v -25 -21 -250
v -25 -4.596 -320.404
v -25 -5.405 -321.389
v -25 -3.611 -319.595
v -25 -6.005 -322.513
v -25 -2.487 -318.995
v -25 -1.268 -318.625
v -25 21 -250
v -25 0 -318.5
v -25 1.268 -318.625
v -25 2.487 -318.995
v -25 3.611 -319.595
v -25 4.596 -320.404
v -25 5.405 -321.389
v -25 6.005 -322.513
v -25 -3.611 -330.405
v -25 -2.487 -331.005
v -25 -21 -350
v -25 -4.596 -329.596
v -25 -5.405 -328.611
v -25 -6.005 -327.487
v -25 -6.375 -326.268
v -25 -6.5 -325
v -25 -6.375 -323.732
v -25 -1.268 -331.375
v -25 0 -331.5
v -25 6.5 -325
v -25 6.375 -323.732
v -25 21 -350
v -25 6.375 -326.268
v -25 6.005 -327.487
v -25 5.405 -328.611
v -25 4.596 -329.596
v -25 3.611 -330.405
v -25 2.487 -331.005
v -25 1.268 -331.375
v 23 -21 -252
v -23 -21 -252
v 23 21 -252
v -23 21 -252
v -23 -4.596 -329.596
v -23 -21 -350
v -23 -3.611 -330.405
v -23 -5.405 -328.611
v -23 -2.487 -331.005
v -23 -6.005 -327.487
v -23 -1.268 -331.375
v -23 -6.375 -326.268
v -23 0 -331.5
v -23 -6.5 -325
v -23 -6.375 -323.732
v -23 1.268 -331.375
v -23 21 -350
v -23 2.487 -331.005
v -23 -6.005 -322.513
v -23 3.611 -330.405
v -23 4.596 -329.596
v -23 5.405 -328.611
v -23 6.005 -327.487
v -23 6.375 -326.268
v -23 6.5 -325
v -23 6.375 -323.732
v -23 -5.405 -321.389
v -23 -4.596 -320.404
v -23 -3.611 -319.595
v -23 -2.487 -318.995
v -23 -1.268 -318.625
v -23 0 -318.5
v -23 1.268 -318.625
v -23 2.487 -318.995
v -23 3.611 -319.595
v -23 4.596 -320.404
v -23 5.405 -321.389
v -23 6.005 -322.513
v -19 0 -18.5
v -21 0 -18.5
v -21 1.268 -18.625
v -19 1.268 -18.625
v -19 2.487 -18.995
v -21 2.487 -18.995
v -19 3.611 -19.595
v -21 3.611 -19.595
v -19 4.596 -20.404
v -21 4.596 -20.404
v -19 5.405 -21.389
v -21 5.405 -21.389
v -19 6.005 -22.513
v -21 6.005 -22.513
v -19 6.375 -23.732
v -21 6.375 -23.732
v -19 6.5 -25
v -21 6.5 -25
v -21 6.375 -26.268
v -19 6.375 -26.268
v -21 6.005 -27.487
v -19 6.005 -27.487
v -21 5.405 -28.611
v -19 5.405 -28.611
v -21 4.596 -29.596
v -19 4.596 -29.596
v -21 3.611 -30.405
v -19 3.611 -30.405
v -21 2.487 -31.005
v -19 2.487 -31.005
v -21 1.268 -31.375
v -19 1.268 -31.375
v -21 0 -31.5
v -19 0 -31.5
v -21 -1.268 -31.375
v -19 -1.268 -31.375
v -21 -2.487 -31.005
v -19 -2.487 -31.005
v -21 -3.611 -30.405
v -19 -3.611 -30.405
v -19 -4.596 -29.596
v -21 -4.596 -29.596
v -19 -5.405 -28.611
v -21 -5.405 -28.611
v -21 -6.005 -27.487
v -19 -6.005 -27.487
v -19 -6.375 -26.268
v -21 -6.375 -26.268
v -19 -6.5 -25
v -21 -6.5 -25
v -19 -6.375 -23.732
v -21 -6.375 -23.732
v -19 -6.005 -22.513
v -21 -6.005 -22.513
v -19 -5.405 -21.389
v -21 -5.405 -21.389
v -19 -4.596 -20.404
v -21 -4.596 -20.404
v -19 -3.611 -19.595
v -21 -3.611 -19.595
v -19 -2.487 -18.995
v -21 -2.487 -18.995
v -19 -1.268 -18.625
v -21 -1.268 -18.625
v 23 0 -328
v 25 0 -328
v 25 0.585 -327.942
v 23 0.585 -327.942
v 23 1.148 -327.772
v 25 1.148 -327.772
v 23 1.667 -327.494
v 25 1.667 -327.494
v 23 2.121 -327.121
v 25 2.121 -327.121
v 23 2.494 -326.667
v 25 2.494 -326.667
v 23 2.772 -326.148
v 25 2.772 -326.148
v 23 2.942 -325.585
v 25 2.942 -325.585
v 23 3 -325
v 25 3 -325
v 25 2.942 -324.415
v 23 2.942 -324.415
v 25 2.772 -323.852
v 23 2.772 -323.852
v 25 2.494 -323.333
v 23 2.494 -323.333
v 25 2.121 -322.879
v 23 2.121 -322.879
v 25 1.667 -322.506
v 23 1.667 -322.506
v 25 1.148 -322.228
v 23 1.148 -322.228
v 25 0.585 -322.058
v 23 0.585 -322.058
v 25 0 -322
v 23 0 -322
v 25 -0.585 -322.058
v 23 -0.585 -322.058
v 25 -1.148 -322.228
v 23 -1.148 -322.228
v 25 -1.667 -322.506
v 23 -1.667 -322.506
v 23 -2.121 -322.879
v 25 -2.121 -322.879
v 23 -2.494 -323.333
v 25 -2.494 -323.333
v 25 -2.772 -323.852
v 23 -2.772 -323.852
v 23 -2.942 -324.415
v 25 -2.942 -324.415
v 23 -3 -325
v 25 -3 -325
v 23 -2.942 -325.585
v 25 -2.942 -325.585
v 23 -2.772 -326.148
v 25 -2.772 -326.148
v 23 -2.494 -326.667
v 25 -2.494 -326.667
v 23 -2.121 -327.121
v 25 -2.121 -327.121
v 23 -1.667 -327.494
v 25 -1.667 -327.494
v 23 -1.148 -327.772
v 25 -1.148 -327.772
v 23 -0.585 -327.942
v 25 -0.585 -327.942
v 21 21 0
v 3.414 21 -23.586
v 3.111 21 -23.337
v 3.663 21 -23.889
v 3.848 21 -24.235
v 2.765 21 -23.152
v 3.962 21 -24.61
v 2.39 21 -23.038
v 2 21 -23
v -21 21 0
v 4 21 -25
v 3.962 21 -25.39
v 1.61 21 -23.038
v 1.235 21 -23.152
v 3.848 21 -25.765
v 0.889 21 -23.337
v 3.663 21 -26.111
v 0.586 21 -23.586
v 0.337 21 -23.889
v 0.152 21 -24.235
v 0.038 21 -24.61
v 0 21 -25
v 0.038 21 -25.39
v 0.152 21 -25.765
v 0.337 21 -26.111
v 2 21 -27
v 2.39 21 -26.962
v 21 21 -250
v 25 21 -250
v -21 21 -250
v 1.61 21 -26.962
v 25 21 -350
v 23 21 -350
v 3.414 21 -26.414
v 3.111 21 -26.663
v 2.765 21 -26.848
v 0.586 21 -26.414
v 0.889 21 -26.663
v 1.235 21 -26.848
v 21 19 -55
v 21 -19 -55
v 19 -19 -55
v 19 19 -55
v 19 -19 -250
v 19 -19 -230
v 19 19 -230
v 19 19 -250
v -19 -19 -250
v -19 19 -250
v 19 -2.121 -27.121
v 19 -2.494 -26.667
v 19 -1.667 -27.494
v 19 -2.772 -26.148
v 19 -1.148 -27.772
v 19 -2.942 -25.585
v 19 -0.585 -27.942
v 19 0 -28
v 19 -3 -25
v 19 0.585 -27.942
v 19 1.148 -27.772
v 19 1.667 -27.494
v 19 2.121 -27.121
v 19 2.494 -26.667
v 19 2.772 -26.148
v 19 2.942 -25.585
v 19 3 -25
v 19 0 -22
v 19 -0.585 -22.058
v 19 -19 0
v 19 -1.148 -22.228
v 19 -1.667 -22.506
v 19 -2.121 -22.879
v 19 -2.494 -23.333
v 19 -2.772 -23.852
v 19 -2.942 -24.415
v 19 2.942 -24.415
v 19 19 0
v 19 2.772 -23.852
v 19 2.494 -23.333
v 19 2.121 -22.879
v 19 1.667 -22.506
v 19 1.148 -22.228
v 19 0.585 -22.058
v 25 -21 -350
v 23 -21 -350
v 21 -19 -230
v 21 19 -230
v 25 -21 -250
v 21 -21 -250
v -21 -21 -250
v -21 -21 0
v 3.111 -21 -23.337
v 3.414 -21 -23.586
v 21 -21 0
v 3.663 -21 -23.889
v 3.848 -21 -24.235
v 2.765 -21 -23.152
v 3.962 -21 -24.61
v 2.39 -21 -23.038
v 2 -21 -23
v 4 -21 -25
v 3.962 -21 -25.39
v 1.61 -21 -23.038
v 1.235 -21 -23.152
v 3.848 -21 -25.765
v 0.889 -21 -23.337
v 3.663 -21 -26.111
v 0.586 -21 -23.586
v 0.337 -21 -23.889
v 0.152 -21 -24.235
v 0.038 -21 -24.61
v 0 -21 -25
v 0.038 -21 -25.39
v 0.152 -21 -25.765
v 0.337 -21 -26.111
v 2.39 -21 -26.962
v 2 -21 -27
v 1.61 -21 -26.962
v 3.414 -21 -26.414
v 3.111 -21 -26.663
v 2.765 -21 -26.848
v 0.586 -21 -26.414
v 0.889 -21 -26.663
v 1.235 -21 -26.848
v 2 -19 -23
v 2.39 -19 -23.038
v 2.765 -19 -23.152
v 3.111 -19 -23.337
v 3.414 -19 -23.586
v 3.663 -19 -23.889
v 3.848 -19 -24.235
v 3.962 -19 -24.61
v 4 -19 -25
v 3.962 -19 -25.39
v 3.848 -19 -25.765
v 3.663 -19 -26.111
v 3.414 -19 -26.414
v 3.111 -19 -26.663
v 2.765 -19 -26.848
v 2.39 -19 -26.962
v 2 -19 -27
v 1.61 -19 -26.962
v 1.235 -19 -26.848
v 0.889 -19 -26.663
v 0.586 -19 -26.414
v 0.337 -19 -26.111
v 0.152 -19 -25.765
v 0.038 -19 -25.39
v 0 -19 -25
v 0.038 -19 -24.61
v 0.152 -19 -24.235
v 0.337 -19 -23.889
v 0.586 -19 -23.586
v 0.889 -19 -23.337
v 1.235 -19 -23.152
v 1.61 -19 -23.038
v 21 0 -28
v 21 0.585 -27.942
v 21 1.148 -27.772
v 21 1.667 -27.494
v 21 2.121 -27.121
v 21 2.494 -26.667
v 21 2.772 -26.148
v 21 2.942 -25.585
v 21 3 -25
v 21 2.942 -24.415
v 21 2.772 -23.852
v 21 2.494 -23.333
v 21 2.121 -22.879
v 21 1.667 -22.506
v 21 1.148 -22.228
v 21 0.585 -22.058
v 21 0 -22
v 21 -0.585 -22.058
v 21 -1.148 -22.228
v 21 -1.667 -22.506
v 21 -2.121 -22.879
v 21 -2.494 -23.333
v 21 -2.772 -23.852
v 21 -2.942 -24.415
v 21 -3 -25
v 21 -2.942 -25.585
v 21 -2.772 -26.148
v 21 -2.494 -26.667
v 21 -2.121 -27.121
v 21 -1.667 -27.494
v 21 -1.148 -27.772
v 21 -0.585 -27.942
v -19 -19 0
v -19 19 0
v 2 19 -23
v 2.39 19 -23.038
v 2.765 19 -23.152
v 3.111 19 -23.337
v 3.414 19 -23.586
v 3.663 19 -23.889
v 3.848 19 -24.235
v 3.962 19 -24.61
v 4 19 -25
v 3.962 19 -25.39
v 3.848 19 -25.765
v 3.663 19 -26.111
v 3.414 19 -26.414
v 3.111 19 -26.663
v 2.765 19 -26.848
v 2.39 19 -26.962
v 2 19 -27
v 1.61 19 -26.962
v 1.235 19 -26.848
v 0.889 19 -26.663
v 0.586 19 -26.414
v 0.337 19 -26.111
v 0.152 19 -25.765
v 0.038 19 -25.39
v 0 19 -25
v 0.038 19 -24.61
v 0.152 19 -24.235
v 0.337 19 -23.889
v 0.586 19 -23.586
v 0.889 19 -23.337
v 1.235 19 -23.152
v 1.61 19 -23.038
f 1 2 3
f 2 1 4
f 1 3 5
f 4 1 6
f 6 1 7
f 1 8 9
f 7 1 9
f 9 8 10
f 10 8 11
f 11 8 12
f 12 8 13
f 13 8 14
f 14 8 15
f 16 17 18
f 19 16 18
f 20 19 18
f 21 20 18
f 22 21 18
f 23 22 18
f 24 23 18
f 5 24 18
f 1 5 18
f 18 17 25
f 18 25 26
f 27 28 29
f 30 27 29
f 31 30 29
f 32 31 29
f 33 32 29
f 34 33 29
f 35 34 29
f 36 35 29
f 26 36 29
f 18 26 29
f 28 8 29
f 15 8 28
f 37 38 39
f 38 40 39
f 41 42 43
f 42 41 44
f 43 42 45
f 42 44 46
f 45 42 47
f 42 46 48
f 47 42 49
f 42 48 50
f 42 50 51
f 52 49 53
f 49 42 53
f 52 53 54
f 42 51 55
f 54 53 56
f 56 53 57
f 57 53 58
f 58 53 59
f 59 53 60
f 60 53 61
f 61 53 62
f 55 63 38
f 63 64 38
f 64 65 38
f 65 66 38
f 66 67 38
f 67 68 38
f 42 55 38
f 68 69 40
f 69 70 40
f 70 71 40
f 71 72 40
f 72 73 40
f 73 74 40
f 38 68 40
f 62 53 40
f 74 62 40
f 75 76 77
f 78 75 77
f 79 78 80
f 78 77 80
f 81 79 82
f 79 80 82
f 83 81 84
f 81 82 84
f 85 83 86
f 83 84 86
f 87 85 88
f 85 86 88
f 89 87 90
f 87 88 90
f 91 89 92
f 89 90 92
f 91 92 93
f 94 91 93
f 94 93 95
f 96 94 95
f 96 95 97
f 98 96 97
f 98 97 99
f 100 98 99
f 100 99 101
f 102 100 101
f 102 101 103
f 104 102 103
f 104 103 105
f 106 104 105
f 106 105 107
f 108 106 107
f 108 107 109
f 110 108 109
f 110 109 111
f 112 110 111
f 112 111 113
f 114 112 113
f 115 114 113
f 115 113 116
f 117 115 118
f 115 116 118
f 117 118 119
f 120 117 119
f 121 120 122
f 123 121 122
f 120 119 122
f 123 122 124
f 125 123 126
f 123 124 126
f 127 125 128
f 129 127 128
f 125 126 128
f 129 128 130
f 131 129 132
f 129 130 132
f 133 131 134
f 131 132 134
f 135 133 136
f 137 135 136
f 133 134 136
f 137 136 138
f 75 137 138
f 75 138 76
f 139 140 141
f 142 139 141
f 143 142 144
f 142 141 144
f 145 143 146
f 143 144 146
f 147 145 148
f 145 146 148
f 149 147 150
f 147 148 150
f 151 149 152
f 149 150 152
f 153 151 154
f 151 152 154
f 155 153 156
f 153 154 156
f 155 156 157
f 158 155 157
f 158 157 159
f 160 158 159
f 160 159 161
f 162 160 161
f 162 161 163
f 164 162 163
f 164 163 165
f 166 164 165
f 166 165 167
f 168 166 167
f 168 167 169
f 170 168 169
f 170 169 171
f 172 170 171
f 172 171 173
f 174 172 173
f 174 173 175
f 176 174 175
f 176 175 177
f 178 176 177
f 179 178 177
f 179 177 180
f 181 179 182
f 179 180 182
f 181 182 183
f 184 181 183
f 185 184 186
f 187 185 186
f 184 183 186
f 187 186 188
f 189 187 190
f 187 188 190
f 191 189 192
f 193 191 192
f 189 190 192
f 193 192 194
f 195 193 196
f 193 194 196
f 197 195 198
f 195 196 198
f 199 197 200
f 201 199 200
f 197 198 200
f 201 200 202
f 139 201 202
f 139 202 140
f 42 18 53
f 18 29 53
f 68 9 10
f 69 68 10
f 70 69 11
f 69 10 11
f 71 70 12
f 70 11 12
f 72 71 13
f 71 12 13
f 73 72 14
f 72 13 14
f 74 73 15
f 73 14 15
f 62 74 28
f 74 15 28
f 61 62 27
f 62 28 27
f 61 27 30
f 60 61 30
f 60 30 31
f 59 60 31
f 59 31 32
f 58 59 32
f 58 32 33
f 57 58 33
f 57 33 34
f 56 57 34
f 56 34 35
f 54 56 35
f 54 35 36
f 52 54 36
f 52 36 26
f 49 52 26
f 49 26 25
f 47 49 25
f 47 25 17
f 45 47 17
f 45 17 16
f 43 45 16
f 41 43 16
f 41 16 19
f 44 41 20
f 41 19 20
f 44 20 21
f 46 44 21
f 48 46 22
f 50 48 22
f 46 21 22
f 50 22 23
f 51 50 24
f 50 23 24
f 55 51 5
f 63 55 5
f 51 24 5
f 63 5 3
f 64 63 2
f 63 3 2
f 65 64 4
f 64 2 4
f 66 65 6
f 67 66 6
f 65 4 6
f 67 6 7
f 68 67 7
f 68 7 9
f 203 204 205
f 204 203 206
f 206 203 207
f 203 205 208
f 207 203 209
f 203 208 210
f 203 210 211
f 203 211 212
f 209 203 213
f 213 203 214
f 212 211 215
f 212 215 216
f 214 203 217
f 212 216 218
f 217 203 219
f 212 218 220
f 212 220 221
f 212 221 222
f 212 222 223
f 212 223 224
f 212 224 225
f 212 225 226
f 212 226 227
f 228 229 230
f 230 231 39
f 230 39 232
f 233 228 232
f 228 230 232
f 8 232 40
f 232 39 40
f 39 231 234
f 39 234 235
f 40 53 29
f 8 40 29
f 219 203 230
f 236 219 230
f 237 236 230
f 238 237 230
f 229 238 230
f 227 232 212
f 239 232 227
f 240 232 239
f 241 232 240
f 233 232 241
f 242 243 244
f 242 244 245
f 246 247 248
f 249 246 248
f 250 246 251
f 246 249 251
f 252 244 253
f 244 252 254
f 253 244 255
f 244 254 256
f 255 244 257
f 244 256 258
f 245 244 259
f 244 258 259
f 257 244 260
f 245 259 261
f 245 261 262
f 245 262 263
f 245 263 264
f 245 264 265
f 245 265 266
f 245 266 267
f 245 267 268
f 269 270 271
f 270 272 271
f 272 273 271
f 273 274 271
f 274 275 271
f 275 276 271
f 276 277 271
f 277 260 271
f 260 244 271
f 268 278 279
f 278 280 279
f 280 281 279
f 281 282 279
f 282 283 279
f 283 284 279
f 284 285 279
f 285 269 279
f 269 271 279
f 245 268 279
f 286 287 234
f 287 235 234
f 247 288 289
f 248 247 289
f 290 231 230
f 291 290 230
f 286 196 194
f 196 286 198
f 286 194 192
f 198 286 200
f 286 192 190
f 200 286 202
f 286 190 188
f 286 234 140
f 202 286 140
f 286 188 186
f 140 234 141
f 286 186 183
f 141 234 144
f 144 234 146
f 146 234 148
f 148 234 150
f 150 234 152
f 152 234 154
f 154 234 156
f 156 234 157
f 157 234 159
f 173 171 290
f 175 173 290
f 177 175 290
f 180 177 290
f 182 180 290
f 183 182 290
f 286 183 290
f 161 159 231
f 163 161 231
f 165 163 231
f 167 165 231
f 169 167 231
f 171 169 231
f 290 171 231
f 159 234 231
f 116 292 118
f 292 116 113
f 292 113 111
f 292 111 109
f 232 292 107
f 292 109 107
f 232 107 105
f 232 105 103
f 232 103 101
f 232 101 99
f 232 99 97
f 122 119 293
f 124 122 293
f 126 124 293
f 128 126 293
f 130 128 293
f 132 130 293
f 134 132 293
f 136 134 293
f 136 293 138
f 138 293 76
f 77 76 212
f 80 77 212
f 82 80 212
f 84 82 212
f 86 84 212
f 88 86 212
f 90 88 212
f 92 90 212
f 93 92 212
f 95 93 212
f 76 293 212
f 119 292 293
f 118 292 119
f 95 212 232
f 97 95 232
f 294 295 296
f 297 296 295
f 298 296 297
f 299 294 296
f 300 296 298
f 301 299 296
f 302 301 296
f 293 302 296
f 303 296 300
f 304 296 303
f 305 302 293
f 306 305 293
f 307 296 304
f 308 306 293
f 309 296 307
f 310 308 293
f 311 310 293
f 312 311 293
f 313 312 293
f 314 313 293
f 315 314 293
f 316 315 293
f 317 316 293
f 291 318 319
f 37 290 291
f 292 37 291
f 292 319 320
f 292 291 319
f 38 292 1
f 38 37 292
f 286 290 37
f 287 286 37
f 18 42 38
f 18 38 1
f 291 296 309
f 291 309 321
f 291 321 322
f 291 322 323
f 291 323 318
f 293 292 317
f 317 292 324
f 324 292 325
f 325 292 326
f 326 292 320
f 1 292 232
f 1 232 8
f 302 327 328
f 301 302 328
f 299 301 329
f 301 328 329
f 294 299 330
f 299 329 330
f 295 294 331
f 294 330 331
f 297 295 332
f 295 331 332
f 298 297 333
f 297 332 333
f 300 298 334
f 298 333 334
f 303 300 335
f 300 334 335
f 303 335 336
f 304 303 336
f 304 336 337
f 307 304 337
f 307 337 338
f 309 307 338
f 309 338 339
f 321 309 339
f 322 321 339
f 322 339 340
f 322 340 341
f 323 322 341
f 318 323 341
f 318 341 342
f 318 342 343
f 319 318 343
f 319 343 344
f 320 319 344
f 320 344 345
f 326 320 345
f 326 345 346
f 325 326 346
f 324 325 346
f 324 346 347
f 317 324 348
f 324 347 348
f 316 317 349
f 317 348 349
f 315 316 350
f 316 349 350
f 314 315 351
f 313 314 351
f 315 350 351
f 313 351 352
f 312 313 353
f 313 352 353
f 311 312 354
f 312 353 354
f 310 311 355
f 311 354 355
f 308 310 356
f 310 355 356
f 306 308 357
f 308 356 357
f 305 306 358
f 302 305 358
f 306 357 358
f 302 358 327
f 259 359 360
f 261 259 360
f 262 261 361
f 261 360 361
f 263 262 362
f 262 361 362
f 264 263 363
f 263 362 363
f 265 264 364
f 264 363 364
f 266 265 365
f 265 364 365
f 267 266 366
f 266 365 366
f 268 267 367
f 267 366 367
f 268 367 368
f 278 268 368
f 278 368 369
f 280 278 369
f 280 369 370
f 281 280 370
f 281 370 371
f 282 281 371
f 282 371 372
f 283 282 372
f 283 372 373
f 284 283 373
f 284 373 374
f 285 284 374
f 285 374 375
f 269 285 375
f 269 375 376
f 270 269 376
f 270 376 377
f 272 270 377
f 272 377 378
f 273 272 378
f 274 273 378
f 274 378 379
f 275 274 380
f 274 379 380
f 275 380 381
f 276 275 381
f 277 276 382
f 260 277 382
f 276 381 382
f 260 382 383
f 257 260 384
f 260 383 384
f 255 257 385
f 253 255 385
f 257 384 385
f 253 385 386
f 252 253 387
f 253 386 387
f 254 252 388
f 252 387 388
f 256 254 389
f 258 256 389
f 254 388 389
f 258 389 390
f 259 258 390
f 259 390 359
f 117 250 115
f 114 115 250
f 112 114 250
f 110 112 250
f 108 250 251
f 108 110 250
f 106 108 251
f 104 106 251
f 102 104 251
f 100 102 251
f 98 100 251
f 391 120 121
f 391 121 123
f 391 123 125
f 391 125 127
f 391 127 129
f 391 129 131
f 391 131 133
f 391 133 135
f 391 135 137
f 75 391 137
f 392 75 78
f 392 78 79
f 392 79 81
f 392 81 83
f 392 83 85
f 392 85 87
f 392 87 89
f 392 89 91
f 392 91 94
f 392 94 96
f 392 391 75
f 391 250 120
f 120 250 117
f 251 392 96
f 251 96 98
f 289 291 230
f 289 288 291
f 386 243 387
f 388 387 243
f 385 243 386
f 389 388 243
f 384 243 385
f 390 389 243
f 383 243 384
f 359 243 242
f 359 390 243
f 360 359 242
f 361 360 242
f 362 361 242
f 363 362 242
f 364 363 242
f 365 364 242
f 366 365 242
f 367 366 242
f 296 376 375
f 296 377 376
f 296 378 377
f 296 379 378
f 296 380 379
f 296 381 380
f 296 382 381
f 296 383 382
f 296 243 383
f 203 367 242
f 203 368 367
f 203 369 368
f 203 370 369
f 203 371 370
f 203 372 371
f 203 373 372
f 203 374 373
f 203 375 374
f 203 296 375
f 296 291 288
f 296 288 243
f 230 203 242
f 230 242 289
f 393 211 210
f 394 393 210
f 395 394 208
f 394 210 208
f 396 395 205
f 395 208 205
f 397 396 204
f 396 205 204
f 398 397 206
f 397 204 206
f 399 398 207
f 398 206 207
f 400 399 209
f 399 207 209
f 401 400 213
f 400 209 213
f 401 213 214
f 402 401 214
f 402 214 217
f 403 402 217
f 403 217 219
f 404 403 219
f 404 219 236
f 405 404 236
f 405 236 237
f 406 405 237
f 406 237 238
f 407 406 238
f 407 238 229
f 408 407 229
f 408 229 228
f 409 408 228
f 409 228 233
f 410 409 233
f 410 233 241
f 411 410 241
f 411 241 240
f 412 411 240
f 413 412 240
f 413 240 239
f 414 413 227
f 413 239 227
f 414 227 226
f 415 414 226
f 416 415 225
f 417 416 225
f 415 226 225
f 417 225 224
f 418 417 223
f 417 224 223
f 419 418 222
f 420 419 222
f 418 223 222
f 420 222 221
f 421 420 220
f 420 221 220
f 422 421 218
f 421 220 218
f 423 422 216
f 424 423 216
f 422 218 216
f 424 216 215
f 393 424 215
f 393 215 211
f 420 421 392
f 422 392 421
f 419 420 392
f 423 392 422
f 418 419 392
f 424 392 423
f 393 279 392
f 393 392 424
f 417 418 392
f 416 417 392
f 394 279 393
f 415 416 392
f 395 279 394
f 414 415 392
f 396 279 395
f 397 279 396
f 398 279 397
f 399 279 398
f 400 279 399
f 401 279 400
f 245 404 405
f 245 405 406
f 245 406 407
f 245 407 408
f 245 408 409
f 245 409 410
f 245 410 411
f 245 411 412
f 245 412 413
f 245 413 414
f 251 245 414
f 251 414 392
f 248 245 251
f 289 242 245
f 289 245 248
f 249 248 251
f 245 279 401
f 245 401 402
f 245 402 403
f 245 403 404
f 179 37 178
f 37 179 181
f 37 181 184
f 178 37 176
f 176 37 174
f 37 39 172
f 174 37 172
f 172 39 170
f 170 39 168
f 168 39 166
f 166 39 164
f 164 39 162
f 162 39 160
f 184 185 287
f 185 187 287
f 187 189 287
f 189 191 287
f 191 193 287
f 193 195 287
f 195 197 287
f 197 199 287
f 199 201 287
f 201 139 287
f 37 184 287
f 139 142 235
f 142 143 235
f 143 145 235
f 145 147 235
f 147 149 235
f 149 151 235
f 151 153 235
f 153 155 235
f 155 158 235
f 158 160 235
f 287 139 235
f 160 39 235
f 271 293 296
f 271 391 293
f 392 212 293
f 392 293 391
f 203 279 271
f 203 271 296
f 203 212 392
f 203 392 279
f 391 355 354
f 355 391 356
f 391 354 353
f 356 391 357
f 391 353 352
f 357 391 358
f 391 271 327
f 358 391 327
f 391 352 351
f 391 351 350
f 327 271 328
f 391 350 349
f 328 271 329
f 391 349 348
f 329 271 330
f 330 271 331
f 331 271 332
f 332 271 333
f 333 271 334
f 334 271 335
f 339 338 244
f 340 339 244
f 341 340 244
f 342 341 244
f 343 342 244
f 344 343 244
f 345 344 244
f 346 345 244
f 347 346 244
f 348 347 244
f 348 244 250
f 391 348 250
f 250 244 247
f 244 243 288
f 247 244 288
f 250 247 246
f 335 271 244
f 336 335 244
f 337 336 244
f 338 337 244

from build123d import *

# Parameters (mm, degrees)
SKETCH1_W           = 42
SKETCH1_H           = 42
SKETCH1_W_2         = 38
SKETCH1_H_2         = 38
BOSS_EXTRUDE1_DEPTH = 250
BOSS_EXTRUDE2_DEPTH = 21
CUT_EXTRUDE1_REACH  = 356.177
SKETCH3_R           = 6.5
CUT_EXTRUDE2_REACH  = 356.177
SKETCH4_R           = 3
SKETCH5_W           = 175
SKETCH5_H           = 38
CUT_EXTRUDE3_DEPTH  = 10
SKETCH6_R           = 2
CUT_EXTRUDE4_DEPTH  = 354.396378023


with BuildPart() as part:
    # Sketch1 → Boss-Extrude1 (new body)
    with BuildSketch(Plane.XY):
        Rectangle(SKETCH1_W, SKETCH1_H)
        Rectangle(SKETCH1_W_2, SKETCH1_H_2, mode=Mode.SUBTRACT)
    extrude(amount=-BOSS_EXTRUDE1_DEPTH)

    # Sketch2 → Boss-Extrude2 (add, symmetric)
    with BuildSketch(Plane(origin=(0, 0, 0), x_dir=(1, 0, 0), z_dir=(0, 1, 0))):
        Polygon((-25, 250), (-25, 350), (-23, 350), (-23, 252), (23, 252), (23, 350), (25, 350), (25, 250), align=None)
    extrude(amount=BOSS_EXTRUDE2_DEPTH, both=True)

    # Sketch3 → Cut-Extrude1 (cut, up to next)
    with BuildSketch(Plane.ZY.offset(25), mode=Mode.PRIVATE) as cut_extrude1_sk1:
        with Locations((-25, 0)):
            Circle(SKETCH3_R)
    cut_extrude1_tool1 = extrude(cut_extrude1_sk1.sketch, amount=-CUT_EXTRUDE1_REACH, mode=Mode.PRIVATE) & part.part
    # Sketch3 → Cut-Extrude1 (cut, up to next)
    with BuildSketch(Plane.ZY.offset(25), mode=Mode.PRIVATE) as cut_extrude1_sk2:
        with Locations((-325, 0)):
            Circle(SKETCH3_R)
    cut_extrude1_tool2 = extrude(cut_extrude1_sk2.sketch, amount=-CUT_EXTRUDE1_REACH, mode=Mode.PRIVATE) & part.part
    add(cut_extrude1_tool1.solids().sort_by_distance((-25, 0, -25))[0], mode=Mode.SUBTRACT)
    add(cut_extrude1_tool2.solids().sort_by_distance((-25, 0, -325))[0], mode=Mode.SUBTRACT)

    # Sketch4 → Cut-Extrude2 (cut, up to next)
    with BuildSketch(Plane(origin=(25, 0, 0), x_dir=(0, 0, -1), z_dir=(1, 0, 0)), mode=Mode.PRIVATE) as cut_extrude2_sk1:
        with Locations((325, 0)):
            Circle(SKETCH4_R)
    cut_extrude2_tool1 = extrude(cut_extrude2_sk1.sketch, amount=-CUT_EXTRUDE2_REACH, mode=Mode.PRIVATE) & part.part
    # Sketch4 → Cut-Extrude2 (cut, up to next)
    with BuildSketch(Plane(origin=(25, 0, 0), x_dir=(0, 0, -1), z_dir=(1, 0, 0)), mode=Mode.PRIVATE) as cut_extrude2_sk2:
        with Locations((25, 0)):
            Circle(SKETCH4_R)
    cut_extrude2_tool2 = extrude(cut_extrude2_sk2.sketch, amount=-CUT_EXTRUDE2_REACH, mode=Mode.PRIVATE) & part.part
    add(cut_extrude2_tool1.solids().sort_by_distance((25, 0, -325))[0], mode=Mode.SUBTRACT)
    add(cut_extrude2_tool2.solids().sort_by_distance((25, 0, -25))[0], mode=Mode.SUBTRACT)

    # Sketch5 → Cut-Extrude3 (cut)
    with BuildSketch(Plane(origin=(21, 0, 0), x_dir=(0, 0, -1), z_dir=(1, 0, 0))):
        with Locations((142.5, 0)):
            Rectangle(SKETCH5_W, SKETCH5_H)
    extrude(amount=-CUT_EXTRUDE3_DEPTH, mode=Mode.SUBTRACT)

    # Sketch6 → Cut-Extrude4 (cut, through all)
    with BuildSketch(Plane(origin=(0, 21, 0), x_dir=(1, 0, 0), z_dir=(0, 1, 0))):
        with Locations(Location((2, 25, 0), (0, 0, 270))):
            Circle(SKETCH6_R)
    extrude(amount=-CUT_EXTRUDE4_DEPTH, mode=Mode.SUBTRACT)


solid = part.part
